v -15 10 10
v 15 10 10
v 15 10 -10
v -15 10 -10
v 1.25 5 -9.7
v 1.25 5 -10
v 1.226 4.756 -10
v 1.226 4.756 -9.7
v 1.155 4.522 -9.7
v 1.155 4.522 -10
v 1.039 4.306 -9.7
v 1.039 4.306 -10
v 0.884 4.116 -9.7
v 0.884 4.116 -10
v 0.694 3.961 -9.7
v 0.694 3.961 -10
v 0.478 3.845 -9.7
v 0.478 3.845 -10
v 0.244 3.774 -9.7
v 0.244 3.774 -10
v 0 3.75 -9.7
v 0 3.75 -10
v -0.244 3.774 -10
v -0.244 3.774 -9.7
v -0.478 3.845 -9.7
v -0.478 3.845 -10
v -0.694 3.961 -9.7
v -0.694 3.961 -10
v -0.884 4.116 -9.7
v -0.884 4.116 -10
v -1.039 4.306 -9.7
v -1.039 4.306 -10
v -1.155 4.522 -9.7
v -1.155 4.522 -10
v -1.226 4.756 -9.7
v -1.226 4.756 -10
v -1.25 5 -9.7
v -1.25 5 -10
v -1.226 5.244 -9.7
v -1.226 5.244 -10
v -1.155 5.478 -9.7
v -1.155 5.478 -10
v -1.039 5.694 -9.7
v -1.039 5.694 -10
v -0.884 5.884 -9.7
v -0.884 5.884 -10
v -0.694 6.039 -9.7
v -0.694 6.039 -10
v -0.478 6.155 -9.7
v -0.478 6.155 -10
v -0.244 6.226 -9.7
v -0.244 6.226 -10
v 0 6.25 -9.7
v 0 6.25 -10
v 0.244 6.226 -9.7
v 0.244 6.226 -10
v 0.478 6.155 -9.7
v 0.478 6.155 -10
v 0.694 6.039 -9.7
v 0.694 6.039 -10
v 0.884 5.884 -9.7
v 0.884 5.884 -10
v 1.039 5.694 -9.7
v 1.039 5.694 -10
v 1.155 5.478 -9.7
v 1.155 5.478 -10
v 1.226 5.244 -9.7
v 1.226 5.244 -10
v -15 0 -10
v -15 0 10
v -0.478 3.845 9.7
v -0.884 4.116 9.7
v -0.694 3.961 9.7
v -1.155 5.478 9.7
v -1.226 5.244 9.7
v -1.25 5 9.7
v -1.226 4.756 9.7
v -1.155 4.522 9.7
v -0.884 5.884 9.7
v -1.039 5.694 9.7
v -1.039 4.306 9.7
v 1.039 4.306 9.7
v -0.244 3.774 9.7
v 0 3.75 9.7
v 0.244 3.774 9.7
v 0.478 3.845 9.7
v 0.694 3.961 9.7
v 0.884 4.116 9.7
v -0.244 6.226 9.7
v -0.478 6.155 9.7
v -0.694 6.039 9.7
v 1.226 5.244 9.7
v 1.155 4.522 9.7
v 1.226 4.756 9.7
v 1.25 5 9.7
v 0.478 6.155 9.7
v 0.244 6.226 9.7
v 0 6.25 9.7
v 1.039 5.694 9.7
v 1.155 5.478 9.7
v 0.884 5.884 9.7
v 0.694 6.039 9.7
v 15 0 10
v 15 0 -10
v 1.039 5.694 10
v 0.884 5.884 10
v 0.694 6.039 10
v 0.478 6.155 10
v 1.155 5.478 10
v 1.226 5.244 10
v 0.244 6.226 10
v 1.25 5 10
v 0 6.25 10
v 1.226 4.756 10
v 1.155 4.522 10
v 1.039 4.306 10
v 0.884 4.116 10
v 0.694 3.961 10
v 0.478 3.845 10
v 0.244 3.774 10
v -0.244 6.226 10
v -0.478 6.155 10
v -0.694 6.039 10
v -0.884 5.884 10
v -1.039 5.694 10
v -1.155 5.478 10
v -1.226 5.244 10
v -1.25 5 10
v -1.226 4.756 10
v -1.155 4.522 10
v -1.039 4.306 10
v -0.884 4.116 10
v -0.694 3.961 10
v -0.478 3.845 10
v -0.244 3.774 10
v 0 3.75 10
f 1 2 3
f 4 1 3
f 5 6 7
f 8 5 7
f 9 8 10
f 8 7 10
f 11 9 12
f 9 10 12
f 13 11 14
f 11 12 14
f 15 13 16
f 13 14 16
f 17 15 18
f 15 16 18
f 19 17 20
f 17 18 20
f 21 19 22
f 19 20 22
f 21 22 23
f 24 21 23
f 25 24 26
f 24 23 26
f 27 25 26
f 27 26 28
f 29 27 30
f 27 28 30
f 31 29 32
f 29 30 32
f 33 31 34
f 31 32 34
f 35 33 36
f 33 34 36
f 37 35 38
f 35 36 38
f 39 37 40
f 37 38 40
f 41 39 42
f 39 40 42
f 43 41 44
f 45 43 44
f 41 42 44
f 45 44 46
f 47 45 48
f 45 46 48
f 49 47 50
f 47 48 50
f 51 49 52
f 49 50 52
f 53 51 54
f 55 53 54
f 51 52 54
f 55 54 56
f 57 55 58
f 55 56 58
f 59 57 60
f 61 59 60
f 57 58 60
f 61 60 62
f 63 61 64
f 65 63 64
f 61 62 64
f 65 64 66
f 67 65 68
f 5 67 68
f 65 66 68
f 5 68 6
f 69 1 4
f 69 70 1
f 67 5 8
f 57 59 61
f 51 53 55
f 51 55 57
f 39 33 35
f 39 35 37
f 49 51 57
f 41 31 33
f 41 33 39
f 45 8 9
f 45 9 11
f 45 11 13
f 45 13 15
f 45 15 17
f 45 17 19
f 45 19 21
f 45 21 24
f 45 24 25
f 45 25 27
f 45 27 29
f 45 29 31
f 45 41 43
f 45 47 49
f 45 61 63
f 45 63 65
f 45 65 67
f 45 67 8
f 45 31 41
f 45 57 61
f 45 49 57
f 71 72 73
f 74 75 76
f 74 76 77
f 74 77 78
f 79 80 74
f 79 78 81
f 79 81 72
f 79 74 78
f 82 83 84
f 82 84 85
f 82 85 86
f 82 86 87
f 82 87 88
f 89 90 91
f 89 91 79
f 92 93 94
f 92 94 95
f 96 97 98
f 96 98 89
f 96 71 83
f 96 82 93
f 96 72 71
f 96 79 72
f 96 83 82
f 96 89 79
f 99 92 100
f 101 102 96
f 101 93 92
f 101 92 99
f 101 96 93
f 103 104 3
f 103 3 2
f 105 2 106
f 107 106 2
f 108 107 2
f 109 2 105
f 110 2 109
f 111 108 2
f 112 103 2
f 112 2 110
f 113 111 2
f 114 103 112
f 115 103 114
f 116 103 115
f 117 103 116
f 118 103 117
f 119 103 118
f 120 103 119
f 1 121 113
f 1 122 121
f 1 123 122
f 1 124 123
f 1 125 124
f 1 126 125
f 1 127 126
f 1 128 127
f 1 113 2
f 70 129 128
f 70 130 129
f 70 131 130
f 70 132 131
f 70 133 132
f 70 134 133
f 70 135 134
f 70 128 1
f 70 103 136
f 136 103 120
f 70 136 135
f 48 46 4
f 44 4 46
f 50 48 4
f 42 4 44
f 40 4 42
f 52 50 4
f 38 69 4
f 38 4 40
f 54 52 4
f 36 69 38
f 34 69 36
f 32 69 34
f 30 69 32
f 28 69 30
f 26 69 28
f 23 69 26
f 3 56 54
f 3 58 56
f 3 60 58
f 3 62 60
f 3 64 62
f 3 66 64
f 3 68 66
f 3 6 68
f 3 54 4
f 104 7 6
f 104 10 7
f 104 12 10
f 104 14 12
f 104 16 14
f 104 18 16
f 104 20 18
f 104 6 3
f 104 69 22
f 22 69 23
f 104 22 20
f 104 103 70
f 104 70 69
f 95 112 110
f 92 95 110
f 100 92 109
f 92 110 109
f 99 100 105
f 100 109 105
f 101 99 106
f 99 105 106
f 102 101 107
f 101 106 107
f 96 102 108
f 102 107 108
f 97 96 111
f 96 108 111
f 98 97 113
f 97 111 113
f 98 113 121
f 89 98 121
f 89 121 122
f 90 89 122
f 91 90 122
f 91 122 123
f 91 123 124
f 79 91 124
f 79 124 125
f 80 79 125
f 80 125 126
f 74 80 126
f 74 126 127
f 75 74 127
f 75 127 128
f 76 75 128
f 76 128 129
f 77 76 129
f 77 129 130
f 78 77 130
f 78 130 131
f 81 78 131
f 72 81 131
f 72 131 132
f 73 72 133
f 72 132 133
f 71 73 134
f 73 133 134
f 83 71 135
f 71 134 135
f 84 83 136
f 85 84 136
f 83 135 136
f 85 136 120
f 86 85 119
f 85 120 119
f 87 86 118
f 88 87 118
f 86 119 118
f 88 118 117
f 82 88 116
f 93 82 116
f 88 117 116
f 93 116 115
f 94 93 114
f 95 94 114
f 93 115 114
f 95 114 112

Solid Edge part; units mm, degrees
sketch "Sketch1" plane through (0, 0, 0) normal (0, -1, 0) x (1, 0, 0)
  line L0 (-15, 10) -> (-15, -10)
  line L1 (-15, -10) -> (15, -10)
  line L2 (15, -10) -> (15, 10)
  line L3 (15, 10) -> (-15, 10)
  dimension "D1" = 10
  dimension "D2" = 15
  dimension "D3" = 15
  dimension "D4" = 10
extrude "Protrusion1" add sketch "Sketch1" against normal blind 10
sketch "Sketch2" plane through (0, 5, -10) normal (0, 0, -1) x (1, 0, 0)
  circle A0 centre (0, 0) radius 1.25
extrude "ExtrudedCutout_1" cut sketch "Sketch2" along normal mid plane 0.6
sketch "Sketch3" plane through (0, 5, 10) normal (0, 0, 1) x (1, 0, 0)
  circle A0 centre (0, 0) radius 1.25
extrude "ExtrudedCutout_2" cut sketch "Sketch3" along normal mid plane 0.6
